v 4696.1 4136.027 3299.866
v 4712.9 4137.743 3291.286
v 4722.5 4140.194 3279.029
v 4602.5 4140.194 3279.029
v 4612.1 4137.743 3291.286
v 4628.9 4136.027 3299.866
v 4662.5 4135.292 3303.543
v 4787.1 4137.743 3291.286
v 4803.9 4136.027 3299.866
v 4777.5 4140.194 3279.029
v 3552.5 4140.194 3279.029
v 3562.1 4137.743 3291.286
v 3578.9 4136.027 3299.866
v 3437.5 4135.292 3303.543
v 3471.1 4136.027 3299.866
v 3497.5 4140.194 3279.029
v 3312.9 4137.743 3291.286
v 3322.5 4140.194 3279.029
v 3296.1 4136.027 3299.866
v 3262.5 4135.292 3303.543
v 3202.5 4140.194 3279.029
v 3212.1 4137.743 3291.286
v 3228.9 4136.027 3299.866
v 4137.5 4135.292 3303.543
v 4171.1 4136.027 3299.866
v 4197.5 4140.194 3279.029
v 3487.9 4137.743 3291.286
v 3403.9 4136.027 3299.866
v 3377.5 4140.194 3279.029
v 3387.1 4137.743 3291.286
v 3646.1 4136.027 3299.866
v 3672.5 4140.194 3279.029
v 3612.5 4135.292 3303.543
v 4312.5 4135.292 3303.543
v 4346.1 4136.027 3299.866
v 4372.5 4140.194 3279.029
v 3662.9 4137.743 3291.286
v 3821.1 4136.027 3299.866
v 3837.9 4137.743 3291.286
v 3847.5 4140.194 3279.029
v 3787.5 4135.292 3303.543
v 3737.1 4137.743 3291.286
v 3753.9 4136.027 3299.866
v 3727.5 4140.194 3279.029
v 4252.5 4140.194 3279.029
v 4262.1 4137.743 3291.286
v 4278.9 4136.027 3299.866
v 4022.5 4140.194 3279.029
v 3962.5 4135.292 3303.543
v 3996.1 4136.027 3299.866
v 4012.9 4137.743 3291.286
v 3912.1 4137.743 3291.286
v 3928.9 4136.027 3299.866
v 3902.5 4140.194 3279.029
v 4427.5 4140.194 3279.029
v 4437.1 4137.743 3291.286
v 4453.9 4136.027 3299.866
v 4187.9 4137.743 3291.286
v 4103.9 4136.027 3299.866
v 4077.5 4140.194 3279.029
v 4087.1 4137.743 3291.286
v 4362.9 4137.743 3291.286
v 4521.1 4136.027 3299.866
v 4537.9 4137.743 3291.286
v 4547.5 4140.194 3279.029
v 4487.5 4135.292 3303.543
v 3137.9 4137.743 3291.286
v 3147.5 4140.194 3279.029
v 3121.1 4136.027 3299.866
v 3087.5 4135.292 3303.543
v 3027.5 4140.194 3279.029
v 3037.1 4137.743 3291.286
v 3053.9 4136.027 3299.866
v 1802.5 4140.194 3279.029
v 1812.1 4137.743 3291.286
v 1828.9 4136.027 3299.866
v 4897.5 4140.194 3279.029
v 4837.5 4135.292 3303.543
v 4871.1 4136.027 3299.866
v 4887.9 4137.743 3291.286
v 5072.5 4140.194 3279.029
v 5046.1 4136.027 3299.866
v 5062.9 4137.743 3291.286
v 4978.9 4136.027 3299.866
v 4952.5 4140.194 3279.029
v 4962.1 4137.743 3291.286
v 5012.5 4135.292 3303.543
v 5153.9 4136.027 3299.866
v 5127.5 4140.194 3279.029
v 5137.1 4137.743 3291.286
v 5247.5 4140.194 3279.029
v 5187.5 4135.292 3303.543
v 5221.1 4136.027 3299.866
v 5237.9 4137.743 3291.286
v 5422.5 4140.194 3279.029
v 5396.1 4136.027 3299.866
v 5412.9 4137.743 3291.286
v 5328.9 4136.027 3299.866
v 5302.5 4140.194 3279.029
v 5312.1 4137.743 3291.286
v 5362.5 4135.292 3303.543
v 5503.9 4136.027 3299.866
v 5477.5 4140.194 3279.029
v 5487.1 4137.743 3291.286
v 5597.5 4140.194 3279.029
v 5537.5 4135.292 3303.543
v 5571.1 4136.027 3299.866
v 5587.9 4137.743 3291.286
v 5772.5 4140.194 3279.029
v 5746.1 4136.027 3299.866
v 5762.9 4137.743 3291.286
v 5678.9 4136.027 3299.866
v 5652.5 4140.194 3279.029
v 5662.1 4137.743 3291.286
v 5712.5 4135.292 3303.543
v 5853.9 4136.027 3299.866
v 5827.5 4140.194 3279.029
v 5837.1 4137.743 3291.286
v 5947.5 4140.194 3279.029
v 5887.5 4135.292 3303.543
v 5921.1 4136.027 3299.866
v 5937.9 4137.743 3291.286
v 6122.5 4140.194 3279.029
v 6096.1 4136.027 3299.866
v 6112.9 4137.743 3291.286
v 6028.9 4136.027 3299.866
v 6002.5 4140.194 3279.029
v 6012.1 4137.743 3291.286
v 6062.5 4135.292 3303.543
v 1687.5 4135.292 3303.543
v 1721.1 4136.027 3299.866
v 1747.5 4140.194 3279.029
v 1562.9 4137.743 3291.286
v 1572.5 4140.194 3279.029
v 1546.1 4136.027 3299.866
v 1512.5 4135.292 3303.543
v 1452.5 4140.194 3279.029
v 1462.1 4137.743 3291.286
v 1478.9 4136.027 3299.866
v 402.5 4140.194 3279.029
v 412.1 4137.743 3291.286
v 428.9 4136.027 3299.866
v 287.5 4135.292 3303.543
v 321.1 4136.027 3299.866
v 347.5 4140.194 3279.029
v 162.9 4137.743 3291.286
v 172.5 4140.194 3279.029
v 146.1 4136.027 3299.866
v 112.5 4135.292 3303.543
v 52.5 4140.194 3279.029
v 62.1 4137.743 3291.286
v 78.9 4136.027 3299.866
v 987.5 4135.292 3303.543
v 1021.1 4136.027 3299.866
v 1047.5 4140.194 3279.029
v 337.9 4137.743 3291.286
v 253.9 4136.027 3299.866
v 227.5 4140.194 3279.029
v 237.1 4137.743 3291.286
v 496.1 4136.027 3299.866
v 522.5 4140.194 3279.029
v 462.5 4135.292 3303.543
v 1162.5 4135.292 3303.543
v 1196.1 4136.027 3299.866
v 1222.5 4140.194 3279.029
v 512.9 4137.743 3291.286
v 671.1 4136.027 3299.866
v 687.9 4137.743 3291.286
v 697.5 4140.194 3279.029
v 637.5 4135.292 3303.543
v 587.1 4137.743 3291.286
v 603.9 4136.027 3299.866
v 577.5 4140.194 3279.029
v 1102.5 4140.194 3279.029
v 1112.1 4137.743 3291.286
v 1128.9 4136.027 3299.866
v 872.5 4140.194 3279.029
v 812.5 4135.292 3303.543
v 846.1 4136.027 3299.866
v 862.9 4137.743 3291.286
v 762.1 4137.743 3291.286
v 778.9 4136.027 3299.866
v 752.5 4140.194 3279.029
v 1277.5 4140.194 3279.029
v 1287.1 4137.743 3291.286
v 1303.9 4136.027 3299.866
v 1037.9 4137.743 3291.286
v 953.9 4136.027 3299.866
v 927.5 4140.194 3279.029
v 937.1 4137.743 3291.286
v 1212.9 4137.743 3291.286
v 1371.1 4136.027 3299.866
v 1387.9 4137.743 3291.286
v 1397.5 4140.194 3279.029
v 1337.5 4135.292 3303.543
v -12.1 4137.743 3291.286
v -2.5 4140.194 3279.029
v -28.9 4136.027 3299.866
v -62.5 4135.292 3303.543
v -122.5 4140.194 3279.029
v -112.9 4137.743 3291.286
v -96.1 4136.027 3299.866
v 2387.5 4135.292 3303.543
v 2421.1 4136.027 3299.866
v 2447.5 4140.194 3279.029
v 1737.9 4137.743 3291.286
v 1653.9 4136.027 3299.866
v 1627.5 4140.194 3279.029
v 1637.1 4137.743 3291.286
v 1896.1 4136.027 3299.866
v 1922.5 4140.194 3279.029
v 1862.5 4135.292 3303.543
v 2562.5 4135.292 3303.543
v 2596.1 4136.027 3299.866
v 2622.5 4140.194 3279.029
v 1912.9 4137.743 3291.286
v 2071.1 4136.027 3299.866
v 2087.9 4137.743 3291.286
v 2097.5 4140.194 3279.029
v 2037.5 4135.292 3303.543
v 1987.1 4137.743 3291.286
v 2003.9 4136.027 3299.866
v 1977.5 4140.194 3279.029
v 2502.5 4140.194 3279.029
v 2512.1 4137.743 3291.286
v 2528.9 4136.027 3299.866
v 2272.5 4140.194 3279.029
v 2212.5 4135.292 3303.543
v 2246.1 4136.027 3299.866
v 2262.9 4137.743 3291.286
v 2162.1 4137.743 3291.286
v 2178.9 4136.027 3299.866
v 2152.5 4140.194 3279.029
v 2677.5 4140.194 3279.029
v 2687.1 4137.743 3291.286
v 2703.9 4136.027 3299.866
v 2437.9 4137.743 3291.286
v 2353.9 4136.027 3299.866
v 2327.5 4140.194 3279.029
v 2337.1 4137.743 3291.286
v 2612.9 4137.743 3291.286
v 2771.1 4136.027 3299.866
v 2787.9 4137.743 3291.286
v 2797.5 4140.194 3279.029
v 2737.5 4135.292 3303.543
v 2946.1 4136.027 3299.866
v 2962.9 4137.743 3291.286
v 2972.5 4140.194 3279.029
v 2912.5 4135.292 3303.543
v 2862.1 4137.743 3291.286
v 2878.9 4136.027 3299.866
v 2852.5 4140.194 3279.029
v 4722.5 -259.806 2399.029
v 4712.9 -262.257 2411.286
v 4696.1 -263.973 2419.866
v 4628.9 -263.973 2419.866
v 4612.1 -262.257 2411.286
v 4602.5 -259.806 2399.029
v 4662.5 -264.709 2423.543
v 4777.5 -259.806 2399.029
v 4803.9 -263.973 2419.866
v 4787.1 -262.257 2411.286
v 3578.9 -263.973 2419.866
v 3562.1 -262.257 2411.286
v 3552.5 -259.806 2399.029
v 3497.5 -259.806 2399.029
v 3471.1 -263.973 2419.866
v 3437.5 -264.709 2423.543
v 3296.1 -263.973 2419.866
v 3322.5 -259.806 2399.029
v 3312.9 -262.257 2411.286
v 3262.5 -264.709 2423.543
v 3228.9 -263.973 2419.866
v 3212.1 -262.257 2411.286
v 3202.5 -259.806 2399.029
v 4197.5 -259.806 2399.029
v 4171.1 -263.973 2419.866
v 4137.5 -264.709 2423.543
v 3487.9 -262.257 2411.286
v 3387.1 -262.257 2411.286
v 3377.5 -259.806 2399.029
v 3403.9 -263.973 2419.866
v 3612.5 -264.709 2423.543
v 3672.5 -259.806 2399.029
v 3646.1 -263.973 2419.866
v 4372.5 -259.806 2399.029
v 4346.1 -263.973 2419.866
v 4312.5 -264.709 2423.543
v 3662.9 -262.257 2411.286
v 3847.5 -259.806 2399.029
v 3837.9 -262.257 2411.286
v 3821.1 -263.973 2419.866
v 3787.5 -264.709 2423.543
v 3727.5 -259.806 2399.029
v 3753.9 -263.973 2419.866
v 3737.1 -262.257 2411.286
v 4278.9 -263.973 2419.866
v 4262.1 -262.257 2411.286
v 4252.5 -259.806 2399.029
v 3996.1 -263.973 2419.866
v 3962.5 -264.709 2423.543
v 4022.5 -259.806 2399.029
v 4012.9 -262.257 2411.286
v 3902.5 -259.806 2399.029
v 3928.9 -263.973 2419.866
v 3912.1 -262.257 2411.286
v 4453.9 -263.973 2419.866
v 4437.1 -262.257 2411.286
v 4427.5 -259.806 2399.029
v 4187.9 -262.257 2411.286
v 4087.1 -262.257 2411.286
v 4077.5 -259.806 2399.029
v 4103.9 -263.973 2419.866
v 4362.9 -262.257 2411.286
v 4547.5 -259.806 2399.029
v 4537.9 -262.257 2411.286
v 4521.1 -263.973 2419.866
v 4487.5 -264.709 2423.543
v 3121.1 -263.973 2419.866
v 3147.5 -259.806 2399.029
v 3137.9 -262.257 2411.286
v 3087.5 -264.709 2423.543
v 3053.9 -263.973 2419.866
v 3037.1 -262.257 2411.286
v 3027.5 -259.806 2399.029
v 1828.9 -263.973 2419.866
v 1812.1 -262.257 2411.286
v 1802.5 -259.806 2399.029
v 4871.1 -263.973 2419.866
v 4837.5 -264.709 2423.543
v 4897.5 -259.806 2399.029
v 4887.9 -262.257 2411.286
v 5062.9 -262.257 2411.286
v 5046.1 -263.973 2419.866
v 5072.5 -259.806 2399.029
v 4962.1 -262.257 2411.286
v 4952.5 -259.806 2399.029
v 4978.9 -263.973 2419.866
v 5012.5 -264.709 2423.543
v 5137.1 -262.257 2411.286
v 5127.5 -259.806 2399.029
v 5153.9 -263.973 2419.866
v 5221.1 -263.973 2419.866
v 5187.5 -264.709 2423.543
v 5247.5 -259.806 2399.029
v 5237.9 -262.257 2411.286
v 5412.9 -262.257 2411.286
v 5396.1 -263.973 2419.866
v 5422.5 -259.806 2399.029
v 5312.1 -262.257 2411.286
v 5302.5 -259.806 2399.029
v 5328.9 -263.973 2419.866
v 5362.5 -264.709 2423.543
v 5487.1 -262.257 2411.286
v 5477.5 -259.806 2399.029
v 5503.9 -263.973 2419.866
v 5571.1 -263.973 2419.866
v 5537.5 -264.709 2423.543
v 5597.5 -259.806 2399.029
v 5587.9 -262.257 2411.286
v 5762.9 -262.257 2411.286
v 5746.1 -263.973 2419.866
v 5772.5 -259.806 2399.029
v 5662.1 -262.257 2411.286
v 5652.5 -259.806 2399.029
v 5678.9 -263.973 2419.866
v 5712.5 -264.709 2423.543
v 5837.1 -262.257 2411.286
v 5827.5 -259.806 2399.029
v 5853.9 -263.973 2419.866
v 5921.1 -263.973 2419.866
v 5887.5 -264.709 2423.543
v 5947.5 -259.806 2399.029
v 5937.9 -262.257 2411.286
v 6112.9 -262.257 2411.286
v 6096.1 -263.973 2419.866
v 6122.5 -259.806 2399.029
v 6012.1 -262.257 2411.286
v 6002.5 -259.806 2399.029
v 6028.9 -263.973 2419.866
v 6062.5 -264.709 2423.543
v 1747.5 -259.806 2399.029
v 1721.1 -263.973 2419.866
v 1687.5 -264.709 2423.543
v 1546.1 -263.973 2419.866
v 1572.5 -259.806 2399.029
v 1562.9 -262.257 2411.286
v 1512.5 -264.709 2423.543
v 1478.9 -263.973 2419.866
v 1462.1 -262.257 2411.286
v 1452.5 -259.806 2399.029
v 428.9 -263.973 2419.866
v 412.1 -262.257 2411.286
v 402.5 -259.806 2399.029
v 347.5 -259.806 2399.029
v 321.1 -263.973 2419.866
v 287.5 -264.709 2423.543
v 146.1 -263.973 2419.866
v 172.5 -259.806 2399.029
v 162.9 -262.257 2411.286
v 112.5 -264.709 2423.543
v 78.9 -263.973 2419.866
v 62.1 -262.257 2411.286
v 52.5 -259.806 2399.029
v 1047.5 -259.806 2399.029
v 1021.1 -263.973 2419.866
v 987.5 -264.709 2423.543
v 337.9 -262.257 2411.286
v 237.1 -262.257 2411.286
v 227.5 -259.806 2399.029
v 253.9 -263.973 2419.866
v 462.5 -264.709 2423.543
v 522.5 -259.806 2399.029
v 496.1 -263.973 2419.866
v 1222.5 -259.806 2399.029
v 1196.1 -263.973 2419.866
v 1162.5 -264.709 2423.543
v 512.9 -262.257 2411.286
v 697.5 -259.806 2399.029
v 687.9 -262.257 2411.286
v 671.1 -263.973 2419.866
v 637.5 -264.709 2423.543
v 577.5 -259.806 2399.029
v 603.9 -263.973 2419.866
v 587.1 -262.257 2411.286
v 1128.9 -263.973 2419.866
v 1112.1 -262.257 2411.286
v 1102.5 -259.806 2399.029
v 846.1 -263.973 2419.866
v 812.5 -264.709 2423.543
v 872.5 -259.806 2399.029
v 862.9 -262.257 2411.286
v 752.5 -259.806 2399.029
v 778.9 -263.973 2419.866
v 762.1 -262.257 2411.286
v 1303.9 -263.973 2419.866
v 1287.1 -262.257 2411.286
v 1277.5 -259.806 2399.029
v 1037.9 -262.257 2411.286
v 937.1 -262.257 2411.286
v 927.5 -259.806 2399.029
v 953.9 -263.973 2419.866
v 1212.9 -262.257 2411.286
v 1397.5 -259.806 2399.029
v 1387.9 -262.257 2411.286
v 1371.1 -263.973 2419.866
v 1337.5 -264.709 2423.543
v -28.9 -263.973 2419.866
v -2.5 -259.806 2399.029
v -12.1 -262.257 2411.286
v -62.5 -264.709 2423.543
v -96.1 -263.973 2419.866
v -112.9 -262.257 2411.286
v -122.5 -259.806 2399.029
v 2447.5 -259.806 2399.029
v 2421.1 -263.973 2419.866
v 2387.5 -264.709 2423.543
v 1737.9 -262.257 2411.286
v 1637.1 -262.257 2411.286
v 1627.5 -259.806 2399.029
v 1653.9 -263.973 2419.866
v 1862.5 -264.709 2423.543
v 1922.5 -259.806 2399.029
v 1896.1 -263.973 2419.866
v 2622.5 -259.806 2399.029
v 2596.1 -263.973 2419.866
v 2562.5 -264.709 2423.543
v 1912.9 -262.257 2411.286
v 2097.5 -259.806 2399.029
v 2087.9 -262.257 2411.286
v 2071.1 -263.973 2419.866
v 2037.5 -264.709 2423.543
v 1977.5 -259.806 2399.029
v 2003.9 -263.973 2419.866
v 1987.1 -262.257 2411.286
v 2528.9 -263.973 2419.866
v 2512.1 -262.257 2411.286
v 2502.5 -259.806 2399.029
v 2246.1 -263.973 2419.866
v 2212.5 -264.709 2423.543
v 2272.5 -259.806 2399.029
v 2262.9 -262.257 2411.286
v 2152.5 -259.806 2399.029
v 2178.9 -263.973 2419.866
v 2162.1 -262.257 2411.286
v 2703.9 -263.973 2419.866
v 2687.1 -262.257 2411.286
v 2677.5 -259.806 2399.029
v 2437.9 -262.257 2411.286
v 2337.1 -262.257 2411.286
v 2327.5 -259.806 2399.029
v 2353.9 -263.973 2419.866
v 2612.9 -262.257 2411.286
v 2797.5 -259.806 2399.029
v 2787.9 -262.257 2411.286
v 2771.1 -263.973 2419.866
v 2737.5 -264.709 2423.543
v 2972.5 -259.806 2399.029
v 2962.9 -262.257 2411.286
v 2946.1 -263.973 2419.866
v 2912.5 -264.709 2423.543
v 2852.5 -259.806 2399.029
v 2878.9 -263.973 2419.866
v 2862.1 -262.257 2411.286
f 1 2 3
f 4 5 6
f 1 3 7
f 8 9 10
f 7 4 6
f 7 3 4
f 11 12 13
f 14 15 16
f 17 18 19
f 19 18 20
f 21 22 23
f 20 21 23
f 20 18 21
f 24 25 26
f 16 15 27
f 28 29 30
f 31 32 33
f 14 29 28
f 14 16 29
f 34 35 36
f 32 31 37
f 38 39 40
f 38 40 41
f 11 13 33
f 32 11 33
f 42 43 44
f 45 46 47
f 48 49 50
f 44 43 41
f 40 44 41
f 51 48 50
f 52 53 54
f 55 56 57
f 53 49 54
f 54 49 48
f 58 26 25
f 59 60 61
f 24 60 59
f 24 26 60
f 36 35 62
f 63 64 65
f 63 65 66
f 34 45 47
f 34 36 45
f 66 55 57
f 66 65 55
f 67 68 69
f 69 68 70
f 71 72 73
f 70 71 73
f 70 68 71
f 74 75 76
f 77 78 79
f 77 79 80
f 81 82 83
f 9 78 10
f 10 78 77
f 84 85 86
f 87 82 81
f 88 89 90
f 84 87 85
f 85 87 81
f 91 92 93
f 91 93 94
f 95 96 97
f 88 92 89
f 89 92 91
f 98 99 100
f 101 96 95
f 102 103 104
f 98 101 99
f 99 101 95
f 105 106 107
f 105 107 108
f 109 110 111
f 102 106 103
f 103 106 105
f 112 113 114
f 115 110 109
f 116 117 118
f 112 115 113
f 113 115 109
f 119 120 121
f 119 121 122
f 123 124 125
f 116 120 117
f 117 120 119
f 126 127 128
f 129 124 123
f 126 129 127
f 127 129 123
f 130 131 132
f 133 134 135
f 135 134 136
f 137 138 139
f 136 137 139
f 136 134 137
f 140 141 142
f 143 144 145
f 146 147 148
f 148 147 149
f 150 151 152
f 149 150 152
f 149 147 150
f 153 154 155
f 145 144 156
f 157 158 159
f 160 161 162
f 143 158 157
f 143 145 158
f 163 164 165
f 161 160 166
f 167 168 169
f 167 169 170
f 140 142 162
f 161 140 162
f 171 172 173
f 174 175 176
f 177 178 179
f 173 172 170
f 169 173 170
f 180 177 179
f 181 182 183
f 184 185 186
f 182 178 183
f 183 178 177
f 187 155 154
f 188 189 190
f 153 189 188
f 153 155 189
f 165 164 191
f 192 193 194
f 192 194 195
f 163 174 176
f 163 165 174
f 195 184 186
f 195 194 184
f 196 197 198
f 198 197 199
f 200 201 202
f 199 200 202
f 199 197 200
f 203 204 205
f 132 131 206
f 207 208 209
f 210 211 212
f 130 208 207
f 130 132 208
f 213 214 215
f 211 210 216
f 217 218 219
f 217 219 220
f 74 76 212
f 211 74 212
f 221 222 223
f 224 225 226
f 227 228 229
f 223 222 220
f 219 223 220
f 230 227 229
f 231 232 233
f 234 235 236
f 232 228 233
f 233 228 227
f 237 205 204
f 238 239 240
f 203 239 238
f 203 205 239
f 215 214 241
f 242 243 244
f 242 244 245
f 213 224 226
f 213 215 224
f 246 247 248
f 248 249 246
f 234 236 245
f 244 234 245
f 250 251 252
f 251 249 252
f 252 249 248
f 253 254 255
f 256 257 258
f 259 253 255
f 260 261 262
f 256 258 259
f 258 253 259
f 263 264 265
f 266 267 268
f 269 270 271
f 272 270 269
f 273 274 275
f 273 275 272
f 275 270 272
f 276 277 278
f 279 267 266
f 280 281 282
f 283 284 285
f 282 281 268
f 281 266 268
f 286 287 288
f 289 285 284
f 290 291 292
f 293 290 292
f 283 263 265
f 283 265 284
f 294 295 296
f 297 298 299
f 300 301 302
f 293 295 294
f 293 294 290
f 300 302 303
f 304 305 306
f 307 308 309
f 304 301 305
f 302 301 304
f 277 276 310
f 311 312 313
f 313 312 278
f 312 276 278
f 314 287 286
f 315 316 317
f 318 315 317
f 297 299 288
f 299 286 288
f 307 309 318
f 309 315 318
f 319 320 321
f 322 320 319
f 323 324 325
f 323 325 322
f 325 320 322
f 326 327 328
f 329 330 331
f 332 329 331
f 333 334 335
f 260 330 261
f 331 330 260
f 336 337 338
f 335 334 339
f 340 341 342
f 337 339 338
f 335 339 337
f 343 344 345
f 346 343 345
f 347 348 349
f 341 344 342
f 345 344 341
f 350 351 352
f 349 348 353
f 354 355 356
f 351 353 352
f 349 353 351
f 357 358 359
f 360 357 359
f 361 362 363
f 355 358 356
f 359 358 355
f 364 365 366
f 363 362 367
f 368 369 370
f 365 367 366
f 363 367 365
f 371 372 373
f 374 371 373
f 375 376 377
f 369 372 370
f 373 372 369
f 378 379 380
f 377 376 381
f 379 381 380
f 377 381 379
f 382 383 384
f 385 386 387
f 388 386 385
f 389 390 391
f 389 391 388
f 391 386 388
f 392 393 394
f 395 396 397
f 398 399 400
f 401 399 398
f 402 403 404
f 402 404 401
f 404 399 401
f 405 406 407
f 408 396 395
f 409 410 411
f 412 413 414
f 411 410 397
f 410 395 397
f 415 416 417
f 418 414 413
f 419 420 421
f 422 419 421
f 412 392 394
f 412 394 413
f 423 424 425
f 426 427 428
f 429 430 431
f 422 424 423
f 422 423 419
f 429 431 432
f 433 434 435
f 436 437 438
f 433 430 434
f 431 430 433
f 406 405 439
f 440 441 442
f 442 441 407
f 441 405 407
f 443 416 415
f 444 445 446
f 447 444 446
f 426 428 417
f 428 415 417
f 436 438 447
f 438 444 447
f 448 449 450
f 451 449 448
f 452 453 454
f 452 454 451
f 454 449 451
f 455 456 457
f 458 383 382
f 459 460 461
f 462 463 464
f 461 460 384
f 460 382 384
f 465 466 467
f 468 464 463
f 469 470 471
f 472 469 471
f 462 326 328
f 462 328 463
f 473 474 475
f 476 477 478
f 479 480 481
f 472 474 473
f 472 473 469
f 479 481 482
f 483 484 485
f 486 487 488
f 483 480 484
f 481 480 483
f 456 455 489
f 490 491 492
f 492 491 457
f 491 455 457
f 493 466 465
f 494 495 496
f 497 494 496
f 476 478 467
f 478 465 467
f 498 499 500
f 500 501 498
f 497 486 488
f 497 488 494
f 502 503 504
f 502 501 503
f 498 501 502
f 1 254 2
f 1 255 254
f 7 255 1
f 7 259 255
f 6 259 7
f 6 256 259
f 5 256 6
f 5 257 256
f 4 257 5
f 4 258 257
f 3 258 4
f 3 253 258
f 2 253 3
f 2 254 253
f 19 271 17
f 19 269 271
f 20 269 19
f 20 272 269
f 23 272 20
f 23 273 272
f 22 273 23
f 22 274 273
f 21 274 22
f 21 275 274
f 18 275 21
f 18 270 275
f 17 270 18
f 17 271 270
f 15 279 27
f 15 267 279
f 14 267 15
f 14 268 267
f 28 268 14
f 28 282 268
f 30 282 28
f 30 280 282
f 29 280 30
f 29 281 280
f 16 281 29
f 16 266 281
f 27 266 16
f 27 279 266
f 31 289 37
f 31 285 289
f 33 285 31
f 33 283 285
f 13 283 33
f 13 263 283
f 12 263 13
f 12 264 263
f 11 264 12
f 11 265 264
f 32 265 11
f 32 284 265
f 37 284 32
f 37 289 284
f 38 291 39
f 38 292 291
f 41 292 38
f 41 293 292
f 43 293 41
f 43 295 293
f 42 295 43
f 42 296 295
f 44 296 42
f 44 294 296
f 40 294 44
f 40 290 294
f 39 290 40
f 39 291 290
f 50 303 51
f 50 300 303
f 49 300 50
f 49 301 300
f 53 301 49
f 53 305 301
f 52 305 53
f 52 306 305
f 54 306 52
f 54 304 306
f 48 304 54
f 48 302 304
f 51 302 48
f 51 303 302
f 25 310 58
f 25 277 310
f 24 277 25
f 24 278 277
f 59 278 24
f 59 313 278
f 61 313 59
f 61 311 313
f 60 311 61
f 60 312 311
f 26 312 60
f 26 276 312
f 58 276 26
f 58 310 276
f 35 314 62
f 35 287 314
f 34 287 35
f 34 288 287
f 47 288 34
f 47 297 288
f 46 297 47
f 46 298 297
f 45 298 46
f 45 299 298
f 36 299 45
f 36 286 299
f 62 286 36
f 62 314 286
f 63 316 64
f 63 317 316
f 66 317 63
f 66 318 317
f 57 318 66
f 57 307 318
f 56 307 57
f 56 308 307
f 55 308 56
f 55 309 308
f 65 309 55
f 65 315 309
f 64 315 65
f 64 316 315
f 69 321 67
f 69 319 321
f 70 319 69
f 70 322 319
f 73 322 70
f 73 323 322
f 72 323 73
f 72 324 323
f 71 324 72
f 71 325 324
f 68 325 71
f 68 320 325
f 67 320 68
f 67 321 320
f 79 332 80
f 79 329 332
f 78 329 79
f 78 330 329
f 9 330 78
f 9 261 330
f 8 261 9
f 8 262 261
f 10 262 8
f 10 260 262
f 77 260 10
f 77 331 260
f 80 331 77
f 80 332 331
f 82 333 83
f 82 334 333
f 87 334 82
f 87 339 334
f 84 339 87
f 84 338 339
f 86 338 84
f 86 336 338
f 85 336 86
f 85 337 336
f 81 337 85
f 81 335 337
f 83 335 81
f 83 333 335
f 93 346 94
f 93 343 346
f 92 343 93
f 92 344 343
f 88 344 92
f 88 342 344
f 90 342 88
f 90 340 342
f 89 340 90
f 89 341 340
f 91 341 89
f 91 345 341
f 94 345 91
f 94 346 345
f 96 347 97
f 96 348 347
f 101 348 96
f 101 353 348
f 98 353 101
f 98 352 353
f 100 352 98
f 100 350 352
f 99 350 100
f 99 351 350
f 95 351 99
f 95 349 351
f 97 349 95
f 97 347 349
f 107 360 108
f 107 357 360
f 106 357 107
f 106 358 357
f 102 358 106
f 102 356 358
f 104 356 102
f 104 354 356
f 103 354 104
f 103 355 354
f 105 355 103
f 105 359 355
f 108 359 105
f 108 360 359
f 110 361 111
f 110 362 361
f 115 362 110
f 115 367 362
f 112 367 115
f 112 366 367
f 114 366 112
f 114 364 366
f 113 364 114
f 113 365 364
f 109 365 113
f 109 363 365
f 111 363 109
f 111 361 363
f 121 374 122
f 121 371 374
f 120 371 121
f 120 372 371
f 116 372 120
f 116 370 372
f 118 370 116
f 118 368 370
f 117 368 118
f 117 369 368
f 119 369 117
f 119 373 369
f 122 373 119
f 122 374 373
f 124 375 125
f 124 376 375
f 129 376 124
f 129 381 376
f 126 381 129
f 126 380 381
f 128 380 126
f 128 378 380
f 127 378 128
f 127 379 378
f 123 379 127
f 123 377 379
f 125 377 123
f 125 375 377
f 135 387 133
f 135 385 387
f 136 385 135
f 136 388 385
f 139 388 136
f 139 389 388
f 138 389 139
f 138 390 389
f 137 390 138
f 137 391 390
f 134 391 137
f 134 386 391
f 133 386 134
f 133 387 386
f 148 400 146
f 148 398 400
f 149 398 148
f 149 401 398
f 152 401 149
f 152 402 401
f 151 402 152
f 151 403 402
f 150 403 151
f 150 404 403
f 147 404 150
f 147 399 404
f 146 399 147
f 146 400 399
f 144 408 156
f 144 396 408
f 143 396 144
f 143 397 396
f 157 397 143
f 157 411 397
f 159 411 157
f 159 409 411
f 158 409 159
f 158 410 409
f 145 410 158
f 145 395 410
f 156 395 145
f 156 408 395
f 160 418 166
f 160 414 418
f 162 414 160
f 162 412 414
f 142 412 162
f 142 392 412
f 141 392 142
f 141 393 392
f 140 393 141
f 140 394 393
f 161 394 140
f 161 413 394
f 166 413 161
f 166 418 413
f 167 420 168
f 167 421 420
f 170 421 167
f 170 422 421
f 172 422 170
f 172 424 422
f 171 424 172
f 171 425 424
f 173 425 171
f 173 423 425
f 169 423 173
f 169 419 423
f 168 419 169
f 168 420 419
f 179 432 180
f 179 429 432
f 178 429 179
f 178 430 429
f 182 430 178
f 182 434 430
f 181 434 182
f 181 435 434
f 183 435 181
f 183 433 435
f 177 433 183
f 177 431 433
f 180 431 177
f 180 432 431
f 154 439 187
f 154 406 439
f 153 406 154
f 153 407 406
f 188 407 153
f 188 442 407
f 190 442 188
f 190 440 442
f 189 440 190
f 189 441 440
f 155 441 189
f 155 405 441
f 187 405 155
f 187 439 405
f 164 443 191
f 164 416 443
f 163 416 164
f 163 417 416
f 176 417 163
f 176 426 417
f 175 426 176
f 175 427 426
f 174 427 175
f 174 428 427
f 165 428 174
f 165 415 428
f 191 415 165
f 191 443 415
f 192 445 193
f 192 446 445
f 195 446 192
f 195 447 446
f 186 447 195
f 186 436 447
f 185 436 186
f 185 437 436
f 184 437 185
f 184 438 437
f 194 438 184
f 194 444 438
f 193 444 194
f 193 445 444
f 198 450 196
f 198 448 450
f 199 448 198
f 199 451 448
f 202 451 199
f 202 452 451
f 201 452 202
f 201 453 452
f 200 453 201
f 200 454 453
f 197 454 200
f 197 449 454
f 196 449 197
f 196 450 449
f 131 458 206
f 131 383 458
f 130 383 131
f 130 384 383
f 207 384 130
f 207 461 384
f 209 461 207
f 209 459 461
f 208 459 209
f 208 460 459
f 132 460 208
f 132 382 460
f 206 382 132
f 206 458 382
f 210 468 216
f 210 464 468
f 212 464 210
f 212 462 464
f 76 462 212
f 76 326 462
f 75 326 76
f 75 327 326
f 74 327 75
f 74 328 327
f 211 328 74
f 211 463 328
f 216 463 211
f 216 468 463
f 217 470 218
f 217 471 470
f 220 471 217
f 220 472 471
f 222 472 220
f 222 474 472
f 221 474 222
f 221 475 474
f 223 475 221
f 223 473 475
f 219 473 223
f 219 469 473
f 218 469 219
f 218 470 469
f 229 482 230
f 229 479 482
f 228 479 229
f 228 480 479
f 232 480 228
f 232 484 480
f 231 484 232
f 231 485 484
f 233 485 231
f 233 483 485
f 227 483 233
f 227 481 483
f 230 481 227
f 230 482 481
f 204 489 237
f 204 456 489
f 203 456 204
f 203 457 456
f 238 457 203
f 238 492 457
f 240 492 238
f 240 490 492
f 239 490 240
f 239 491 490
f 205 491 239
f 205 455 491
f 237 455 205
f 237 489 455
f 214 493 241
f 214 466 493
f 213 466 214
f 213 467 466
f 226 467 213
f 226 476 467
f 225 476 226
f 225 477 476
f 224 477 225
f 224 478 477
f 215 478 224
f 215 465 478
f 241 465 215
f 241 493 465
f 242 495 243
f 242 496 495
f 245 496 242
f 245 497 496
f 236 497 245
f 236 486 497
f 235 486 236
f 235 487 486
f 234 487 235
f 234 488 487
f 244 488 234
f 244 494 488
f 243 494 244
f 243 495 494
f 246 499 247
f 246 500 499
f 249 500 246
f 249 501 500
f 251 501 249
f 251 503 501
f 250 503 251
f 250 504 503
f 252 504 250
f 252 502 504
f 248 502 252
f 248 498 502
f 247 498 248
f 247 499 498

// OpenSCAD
// file: tea_shop_roof_parameters.scad
// =============================================================================
// Tea Shop — GROUP 2: ROOF PARAMETERS
// -----------------------------------------------------------------------------
// OpenSCAD native unit: 1 mm (1000 mm = 1.0 m). Real-life scale.
// Reuses Group 1 (Base & Shell) dimensions and shared global coordinate system:
//   +X -> left -> right  (building width along X, left wall at X = 0)
//   +Y -> front -> back  (building depth along Y, front eave at Y = 0)
//   +Z -> up             (ground / plinth datum = Z = 0)
// =============================================================================

// --- SHARED GLOBAL VARIABLES FROM GROUP 1 (identical values) -----------------
WALL_T             = 250;   // wall panel thickness                      (0.25 m)
BUILD_W            = 6000;  // building width along X, left -> right      (6.00 m)
BUILD_D            = 4000;  // building depth along Y, front eave -> back (4.00 m)
BACK_H             = 3200;  // full wall height at the BACK (tall side)   (3.20 m)
FRONT_H            = 2400;  // wall height at the FRONT eave (short side) (2.40 m)

// Aliases matching Group 1's tea_shop_parameters.scad naming convention
wall_thickness     = WALL_T;
building_width     = BUILD_W;
building_depth     = BUILD_D;
back_height        = BACK_H;
front_eave_height  = FRONT_H;

// --- GROUP 2: ROOF SLAB & OVERHANG PARAMETERS --------------------------------
ROOF_THICKNESS      = 50;   // structural substrate slab thickness       (0.05 m)
ROOF_OVERHANG_LEFT  = 150;  // overhang beyond outer face of left wall    (0.15 m)
ROOF_OVERHANG_RIGHT = 150;  // overhang beyond outer face of right wall   (0.15 m)
ROOF_OVERHANG_BACK  = 150;  // overhang beyond outer face of back wall    (0.15 m)
ROOF_OVERHANG_FRONT = 250;  // overhang forward past front eave wall      (0.25 m)
                            // (Estimated: in reference images, the tiled roof
                            //  terminates ~250mm past the front wall where the
                            //  pergola rafters tie in. Tune here if desired.)

// --- FASCIA / BARGEBOARD TRIM PARAMETERS ------------------------------------
FASCIA_THICKNESS    = 30;   // board thickness (along X for sides, Y for front)
FASCIA_WIDTH        = 100;  // board face height (normal to roof plane)

// --- TOP RIDGE CAPPING STRIP PARAMETERS -------------------------------------
// (Raised capping strip running along the highest back edge where roof meets
//  back wall, visible in wireframe and clay renders to seal top tile ends)
RIDGE_CAP_WIDTH     = 100;  // width / run of capping strip along slope   (0.10 m)
RIDGE_CAP_HEIGHT    = 35;   // raised bump height of capping strip        (0.035 m)

// --- TERRACOTTA ROOF TILE GEOMETRY PARAMETERS -------------------------------
// Shallow repeating barrel / curved ridges running down the slope direction
TILE_PITCH          = 175;  // center-to-center spacing along X between tile crests
TILE_WIDTH          = 120;  // width of each individual curved tile crest
TILE_HEIGHT         = 25;   // raised crest height of tile bump above slab
TILE_FN             = 16;   // polygon facets for lightweight STL export

// =============================================================================
// MATHEMATICAL SLOPE DERIVATION (Trig / Geometry)
// -----------------------------------------------------------------------------
// The monopitch lean-to roof connects the top of the short front wall (Z=FRONT_H
// at Y=0) to the top of the tall back wall (Z=BACK_H at Y=BUILD_D).
//
//   Vertical Rise : ROOF_RISE  = BACK_H - FRONT_H = 3200 - 2400 = 800 mm
//   Horizontal Run: ROOF_RUN   = BUILD_D = 4000 mm
//   Slope Tangent : tan(theta) = Rise / Run = 800 / 4000 = 0.20
//   Slope Angle   : ROOF_ANGLE = atan(0.20) ≈ 11.30993°
//
// Using the exact trigonometric angle prevents any height drift between the
// walls and the roof.
// =============================================================================
ROOF_RISE           = BACK_H - FRONT_H;
ROOF_RUN            = BUILD_D;
ROOF_ANGLE          = atan(ROOF_RISE / ROOF_RUN);

// Total projected extents:
ROOF_WIDTH          = BUILD_W + ROOF_OVERHANG_LEFT + ROOF_OVERHANG_RIGHT;
ROOF_DEPTH_PROJ     = BUILD_D + ROOF_OVERHANG_FRONT + ROOF_OVERHANG_BACK;

// True length along the sloped roof plane (hypotenuse of total run and rise):
ROOF_SLOPE_LEN      = ROOF_DEPTH_PROJ / cos(ROOF_ANGLE);

// Reference coordinate for the sloped roof frame:
// Origin at the lowest front-left corner of the sloped roof slab bottom face
ROOF_ORIGIN_X       = -ROOF_OVERHANG_LEFT;
ROOF_ORIGIN_Y       = -ROOF_OVERHANG_FRONT;
ROOF_ORIGIN_Z       = FRONT_H - ROOF_OVERHANG_FRONT * tan(ROOF_ANGLE);
// file: tea_shop_roof_modules.scad
// =============================================================================
// Tea Shop — GROUP 2: ROOF MODULE LIBRARY
// -----------------------------------------------------------------------------
// This file DEFINES all roof parts (and visual assemble() preview).
// It creates NO geometry on its own when included, allowing individual
// export parts (part_*.scad) and the assembly file to include it cleanly.
//
// SHARED GLOBAL COORDINATE SYSTEM:
//   +X -> left -> right  (0 = left wall outer face, BUILD_W = right wall)
//   +Y -> front -> back  (0 = front eave wall face, BUILD_D = back wall)
//   +Z -> up             (0 = plinth / porch floor datum)
//
// All parts are positioned in place so exported STLs align without manual transforms.
//
// TODO: The wooden pergola structure (posts, crossbeams, longitudinal purlins,
//       flat roof slats, and signboard brackets) is a separate upcoming group
//       and will attach along the front eave edge (Y = -ROOF_OVERHANG_FRONT to 0)
//       extending forward over the porch slab (-base_front_margin .. 0).
// =============================================================================

include <tea_shop_roof_parameters.scad>;

// -----------------------------------------------------------------------------
// _roof_transform — internal transformation helper.
// Translates to the lowest front-left corner of the roof slab bottom face
// (X = -ROOF_OVERHANG_LEFT, Y = -ROOF_OVERHANG_FRONT, Z = ROOF_ORIGIN_Z)
// and rotates around the X-axis by ROOF_ANGLE (pitch angle).
//
// In the child coordinate system:
//   local X : across roof width [0 .. ROOF_WIDTH]
//   local Y : along roof slope UP from front eave to back [0 .. ROOF_SLOPE_LEN]
//   local Z : normal (perpendicular) to the roof plane, pointing up [0 .. thickness]
// -----------------------------------------------------------------------------
module _roof_transform() {
    translate([ROOF_ORIGIN_X, ROOF_ORIGIN_Y, ROOF_ORIGIN_Z])
        rotate([ROOF_ANGLE, 0, 0])
            children();
}


// =============================================================================
// 1. roof_slab — the structural roof substrate.
// A flat slanted slab resting directly on top of the front, back, and side walls.
// Overhangs the building on left, right, and back, and projects forward past
// the front eave to shelter the front wall and meet the pergola frame.
// =============================================================================
module roof_slab() {
    _roof_transform()
        cube([ROOF_WIDTH, ROOF_SLOPE_LEN, ROOF_THICKNESS]);
}


// =============================================================================
// 2. ridge_cap_or_top_trim — raised cap strip along the high back edge.
// As confirmed in the wireframe (countryside-tea-shop-3d-model-9cc7378ff7.webp)
// and clay render (countryside-tea-shop-3d-model-4b97af2b49.webp), this is a
// raised half-round/chamfered capping strip running along the very top edge of
// the roof where it meets the tall back wall, sealing the tile ends against weather.
// =============================================================================
module _ridge_cap_profile_2d() {
    polygon(points = [
        [-RIDGE_CAP_WIDTH/2, 0],
        [-RIDGE_CAP_WIDTH*0.4, RIDGE_CAP_HEIGHT*0.7],
        [-RIDGE_CAP_WIDTH*0.2, RIDGE_CAP_HEIGHT*0.95],
        [ 0,                   RIDGE_CAP_HEIGHT],
        [ RIDGE_CAP_WIDTH*0.2, RIDGE_CAP_HEIGHT*0.95],
        [ RIDGE_CAP_WIDTH*0.4, RIDGE_CAP_HEIGHT*0.7],
        [ RIDGE_CAP_WIDTH/2, 0]
    ]);
}

module ridge_cap_or_top_trim() {
    _roof_transform() {
        translate([-FASCIA_THICKNESS, ROOF_SLOPE_LEN - RIDGE_CAP_WIDTH/2, ROOF_THICKNESS + TILE_HEIGHT])
            rotate([0, 90, 0])
                linear_extrude(height = ROOF_WIDTH + 2 * FASCIA_THICKNESS)
                    _ridge_cap_profile_2d();
    }
}


// =============================================================================
// 3. eave_fascia_left and eave_fascia_right — wooden trim boards running along
// the left and right sloped edges (rakes/verges) of the roof slab.
// Visible in textured renders as the dark timber strips along the outer roof edges.
// Covers both the slab edge and tile profile, extending slightly below the slab.
// =============================================================================
module eave_fascia_left() {
    _roof_transform() {
        translate([-FASCIA_THICKNESS, 0, -(FASCIA_WIDTH - ROOF_THICKNESS)/2])
            cube([FASCIA_THICKNESS, ROOF_SLOPE_LEN, FASCIA_WIDTH]);
    }
}

module eave_fascia_right() {
    _roof_transform() {
        translate([ROOF_WIDTH, 0, -(FASCIA_WIDTH - ROOF_THICKNESS)/2])
            cube([FASCIA_THICKNESS, ROOF_SLOPE_LEN, FASCIA_WIDTH]);
    }
}


// =============================================================================
// 4. eave_fascia_front — horizontal trim board running across the low front
// eave of the roof slab, immediately above where the pergola structure connects.
// =============================================================================
module eave_fascia_front() {
    _roof_transform() {
        translate([-FASCIA_THICKNESS, -FASCIA_THICKNESS, -(FASCIA_WIDTH - ROOF_THICKNESS)/2])
            cube([ROOF_WIDTH + 2 * FASCIA_THICKNESS, FASCIA_THICKNESS, FASCIA_WIDTH]);
    }
}


// =============================================================================
// 5. roof_tile_pattern — shallow repeating bump/ridge pattern on the top face
// of roof_slab(), representing the terracotta barrel tiles visible in the renders.
// Modeled as real geometry using lightweight 2D extruded curved crests running
// down the slope direction (local Y) and repeated along local X with a for loop.
// Parametric spacing (TILE_PITCH) and bump size (TILE_WIDTH, TILE_HEIGHT) allow
// tuning print resolution and file size.
// =============================================================================
module _tile_crest_2d() {
    polygon(points = [
        [-TILE_WIDTH * 0.50, 0],
        [-TILE_WIDTH * 0.42, TILE_HEIGHT * 0.50],
        [-TILE_WIDTH * 0.28, TILE_HEIGHT * 0.85],
        [0,                  TILE_HEIGHT],
        [ TILE_WIDTH * 0.28, TILE_HEIGHT * 0.85],
        [ TILE_WIDTH * 0.42, TILE_HEIGHT * 0.50],
        [ TILE_WIDTH * 0.50, 0]
    ]);
}

module roof_tile_pattern() {
    _roof_transform() {
        rotate([90, 0, 0])
        translate([0, ROOF_THICKNESS, -ROOF_SLOPE_LEN])
        linear_extrude(height = ROOF_SLOPE_LEN) {
            for (x = [TILE_PITCH/2 : TILE_PITCH : ROOF_WIDTH - TILE_PITCH/2]) {
                translate([x, 0, 0])
                    _tile_crest_2d();
            }
        }
    }
}


// =============================================================================
// assemble — visual verification assembly for Group 2 pieces (not for export).
// Displays each module in a distinct contrasting color.
// =============================================================================
module assemble() {
    color("Tan")          roof_slab();
    color("Chocolate")    roof_tile_pattern();
    color("DarkRed")      ridge_cap_or_top_trim();
    color("SaddleBrown")  eave_fascia_left();
    color("SaddleBrown")  eave_fascia_right();
    color("SaddleBrown")  eave_fascia_front();
}
// main file
// =============================================================================
// part_roof_tiles.scad — export the TERRACOTTA ROOF TILE PATTERN only.
// Press F6 (render), then export as STL.
// =============================================================================

include <tea_shop_roof_modules.scad>;

roof_tile_pattern();
